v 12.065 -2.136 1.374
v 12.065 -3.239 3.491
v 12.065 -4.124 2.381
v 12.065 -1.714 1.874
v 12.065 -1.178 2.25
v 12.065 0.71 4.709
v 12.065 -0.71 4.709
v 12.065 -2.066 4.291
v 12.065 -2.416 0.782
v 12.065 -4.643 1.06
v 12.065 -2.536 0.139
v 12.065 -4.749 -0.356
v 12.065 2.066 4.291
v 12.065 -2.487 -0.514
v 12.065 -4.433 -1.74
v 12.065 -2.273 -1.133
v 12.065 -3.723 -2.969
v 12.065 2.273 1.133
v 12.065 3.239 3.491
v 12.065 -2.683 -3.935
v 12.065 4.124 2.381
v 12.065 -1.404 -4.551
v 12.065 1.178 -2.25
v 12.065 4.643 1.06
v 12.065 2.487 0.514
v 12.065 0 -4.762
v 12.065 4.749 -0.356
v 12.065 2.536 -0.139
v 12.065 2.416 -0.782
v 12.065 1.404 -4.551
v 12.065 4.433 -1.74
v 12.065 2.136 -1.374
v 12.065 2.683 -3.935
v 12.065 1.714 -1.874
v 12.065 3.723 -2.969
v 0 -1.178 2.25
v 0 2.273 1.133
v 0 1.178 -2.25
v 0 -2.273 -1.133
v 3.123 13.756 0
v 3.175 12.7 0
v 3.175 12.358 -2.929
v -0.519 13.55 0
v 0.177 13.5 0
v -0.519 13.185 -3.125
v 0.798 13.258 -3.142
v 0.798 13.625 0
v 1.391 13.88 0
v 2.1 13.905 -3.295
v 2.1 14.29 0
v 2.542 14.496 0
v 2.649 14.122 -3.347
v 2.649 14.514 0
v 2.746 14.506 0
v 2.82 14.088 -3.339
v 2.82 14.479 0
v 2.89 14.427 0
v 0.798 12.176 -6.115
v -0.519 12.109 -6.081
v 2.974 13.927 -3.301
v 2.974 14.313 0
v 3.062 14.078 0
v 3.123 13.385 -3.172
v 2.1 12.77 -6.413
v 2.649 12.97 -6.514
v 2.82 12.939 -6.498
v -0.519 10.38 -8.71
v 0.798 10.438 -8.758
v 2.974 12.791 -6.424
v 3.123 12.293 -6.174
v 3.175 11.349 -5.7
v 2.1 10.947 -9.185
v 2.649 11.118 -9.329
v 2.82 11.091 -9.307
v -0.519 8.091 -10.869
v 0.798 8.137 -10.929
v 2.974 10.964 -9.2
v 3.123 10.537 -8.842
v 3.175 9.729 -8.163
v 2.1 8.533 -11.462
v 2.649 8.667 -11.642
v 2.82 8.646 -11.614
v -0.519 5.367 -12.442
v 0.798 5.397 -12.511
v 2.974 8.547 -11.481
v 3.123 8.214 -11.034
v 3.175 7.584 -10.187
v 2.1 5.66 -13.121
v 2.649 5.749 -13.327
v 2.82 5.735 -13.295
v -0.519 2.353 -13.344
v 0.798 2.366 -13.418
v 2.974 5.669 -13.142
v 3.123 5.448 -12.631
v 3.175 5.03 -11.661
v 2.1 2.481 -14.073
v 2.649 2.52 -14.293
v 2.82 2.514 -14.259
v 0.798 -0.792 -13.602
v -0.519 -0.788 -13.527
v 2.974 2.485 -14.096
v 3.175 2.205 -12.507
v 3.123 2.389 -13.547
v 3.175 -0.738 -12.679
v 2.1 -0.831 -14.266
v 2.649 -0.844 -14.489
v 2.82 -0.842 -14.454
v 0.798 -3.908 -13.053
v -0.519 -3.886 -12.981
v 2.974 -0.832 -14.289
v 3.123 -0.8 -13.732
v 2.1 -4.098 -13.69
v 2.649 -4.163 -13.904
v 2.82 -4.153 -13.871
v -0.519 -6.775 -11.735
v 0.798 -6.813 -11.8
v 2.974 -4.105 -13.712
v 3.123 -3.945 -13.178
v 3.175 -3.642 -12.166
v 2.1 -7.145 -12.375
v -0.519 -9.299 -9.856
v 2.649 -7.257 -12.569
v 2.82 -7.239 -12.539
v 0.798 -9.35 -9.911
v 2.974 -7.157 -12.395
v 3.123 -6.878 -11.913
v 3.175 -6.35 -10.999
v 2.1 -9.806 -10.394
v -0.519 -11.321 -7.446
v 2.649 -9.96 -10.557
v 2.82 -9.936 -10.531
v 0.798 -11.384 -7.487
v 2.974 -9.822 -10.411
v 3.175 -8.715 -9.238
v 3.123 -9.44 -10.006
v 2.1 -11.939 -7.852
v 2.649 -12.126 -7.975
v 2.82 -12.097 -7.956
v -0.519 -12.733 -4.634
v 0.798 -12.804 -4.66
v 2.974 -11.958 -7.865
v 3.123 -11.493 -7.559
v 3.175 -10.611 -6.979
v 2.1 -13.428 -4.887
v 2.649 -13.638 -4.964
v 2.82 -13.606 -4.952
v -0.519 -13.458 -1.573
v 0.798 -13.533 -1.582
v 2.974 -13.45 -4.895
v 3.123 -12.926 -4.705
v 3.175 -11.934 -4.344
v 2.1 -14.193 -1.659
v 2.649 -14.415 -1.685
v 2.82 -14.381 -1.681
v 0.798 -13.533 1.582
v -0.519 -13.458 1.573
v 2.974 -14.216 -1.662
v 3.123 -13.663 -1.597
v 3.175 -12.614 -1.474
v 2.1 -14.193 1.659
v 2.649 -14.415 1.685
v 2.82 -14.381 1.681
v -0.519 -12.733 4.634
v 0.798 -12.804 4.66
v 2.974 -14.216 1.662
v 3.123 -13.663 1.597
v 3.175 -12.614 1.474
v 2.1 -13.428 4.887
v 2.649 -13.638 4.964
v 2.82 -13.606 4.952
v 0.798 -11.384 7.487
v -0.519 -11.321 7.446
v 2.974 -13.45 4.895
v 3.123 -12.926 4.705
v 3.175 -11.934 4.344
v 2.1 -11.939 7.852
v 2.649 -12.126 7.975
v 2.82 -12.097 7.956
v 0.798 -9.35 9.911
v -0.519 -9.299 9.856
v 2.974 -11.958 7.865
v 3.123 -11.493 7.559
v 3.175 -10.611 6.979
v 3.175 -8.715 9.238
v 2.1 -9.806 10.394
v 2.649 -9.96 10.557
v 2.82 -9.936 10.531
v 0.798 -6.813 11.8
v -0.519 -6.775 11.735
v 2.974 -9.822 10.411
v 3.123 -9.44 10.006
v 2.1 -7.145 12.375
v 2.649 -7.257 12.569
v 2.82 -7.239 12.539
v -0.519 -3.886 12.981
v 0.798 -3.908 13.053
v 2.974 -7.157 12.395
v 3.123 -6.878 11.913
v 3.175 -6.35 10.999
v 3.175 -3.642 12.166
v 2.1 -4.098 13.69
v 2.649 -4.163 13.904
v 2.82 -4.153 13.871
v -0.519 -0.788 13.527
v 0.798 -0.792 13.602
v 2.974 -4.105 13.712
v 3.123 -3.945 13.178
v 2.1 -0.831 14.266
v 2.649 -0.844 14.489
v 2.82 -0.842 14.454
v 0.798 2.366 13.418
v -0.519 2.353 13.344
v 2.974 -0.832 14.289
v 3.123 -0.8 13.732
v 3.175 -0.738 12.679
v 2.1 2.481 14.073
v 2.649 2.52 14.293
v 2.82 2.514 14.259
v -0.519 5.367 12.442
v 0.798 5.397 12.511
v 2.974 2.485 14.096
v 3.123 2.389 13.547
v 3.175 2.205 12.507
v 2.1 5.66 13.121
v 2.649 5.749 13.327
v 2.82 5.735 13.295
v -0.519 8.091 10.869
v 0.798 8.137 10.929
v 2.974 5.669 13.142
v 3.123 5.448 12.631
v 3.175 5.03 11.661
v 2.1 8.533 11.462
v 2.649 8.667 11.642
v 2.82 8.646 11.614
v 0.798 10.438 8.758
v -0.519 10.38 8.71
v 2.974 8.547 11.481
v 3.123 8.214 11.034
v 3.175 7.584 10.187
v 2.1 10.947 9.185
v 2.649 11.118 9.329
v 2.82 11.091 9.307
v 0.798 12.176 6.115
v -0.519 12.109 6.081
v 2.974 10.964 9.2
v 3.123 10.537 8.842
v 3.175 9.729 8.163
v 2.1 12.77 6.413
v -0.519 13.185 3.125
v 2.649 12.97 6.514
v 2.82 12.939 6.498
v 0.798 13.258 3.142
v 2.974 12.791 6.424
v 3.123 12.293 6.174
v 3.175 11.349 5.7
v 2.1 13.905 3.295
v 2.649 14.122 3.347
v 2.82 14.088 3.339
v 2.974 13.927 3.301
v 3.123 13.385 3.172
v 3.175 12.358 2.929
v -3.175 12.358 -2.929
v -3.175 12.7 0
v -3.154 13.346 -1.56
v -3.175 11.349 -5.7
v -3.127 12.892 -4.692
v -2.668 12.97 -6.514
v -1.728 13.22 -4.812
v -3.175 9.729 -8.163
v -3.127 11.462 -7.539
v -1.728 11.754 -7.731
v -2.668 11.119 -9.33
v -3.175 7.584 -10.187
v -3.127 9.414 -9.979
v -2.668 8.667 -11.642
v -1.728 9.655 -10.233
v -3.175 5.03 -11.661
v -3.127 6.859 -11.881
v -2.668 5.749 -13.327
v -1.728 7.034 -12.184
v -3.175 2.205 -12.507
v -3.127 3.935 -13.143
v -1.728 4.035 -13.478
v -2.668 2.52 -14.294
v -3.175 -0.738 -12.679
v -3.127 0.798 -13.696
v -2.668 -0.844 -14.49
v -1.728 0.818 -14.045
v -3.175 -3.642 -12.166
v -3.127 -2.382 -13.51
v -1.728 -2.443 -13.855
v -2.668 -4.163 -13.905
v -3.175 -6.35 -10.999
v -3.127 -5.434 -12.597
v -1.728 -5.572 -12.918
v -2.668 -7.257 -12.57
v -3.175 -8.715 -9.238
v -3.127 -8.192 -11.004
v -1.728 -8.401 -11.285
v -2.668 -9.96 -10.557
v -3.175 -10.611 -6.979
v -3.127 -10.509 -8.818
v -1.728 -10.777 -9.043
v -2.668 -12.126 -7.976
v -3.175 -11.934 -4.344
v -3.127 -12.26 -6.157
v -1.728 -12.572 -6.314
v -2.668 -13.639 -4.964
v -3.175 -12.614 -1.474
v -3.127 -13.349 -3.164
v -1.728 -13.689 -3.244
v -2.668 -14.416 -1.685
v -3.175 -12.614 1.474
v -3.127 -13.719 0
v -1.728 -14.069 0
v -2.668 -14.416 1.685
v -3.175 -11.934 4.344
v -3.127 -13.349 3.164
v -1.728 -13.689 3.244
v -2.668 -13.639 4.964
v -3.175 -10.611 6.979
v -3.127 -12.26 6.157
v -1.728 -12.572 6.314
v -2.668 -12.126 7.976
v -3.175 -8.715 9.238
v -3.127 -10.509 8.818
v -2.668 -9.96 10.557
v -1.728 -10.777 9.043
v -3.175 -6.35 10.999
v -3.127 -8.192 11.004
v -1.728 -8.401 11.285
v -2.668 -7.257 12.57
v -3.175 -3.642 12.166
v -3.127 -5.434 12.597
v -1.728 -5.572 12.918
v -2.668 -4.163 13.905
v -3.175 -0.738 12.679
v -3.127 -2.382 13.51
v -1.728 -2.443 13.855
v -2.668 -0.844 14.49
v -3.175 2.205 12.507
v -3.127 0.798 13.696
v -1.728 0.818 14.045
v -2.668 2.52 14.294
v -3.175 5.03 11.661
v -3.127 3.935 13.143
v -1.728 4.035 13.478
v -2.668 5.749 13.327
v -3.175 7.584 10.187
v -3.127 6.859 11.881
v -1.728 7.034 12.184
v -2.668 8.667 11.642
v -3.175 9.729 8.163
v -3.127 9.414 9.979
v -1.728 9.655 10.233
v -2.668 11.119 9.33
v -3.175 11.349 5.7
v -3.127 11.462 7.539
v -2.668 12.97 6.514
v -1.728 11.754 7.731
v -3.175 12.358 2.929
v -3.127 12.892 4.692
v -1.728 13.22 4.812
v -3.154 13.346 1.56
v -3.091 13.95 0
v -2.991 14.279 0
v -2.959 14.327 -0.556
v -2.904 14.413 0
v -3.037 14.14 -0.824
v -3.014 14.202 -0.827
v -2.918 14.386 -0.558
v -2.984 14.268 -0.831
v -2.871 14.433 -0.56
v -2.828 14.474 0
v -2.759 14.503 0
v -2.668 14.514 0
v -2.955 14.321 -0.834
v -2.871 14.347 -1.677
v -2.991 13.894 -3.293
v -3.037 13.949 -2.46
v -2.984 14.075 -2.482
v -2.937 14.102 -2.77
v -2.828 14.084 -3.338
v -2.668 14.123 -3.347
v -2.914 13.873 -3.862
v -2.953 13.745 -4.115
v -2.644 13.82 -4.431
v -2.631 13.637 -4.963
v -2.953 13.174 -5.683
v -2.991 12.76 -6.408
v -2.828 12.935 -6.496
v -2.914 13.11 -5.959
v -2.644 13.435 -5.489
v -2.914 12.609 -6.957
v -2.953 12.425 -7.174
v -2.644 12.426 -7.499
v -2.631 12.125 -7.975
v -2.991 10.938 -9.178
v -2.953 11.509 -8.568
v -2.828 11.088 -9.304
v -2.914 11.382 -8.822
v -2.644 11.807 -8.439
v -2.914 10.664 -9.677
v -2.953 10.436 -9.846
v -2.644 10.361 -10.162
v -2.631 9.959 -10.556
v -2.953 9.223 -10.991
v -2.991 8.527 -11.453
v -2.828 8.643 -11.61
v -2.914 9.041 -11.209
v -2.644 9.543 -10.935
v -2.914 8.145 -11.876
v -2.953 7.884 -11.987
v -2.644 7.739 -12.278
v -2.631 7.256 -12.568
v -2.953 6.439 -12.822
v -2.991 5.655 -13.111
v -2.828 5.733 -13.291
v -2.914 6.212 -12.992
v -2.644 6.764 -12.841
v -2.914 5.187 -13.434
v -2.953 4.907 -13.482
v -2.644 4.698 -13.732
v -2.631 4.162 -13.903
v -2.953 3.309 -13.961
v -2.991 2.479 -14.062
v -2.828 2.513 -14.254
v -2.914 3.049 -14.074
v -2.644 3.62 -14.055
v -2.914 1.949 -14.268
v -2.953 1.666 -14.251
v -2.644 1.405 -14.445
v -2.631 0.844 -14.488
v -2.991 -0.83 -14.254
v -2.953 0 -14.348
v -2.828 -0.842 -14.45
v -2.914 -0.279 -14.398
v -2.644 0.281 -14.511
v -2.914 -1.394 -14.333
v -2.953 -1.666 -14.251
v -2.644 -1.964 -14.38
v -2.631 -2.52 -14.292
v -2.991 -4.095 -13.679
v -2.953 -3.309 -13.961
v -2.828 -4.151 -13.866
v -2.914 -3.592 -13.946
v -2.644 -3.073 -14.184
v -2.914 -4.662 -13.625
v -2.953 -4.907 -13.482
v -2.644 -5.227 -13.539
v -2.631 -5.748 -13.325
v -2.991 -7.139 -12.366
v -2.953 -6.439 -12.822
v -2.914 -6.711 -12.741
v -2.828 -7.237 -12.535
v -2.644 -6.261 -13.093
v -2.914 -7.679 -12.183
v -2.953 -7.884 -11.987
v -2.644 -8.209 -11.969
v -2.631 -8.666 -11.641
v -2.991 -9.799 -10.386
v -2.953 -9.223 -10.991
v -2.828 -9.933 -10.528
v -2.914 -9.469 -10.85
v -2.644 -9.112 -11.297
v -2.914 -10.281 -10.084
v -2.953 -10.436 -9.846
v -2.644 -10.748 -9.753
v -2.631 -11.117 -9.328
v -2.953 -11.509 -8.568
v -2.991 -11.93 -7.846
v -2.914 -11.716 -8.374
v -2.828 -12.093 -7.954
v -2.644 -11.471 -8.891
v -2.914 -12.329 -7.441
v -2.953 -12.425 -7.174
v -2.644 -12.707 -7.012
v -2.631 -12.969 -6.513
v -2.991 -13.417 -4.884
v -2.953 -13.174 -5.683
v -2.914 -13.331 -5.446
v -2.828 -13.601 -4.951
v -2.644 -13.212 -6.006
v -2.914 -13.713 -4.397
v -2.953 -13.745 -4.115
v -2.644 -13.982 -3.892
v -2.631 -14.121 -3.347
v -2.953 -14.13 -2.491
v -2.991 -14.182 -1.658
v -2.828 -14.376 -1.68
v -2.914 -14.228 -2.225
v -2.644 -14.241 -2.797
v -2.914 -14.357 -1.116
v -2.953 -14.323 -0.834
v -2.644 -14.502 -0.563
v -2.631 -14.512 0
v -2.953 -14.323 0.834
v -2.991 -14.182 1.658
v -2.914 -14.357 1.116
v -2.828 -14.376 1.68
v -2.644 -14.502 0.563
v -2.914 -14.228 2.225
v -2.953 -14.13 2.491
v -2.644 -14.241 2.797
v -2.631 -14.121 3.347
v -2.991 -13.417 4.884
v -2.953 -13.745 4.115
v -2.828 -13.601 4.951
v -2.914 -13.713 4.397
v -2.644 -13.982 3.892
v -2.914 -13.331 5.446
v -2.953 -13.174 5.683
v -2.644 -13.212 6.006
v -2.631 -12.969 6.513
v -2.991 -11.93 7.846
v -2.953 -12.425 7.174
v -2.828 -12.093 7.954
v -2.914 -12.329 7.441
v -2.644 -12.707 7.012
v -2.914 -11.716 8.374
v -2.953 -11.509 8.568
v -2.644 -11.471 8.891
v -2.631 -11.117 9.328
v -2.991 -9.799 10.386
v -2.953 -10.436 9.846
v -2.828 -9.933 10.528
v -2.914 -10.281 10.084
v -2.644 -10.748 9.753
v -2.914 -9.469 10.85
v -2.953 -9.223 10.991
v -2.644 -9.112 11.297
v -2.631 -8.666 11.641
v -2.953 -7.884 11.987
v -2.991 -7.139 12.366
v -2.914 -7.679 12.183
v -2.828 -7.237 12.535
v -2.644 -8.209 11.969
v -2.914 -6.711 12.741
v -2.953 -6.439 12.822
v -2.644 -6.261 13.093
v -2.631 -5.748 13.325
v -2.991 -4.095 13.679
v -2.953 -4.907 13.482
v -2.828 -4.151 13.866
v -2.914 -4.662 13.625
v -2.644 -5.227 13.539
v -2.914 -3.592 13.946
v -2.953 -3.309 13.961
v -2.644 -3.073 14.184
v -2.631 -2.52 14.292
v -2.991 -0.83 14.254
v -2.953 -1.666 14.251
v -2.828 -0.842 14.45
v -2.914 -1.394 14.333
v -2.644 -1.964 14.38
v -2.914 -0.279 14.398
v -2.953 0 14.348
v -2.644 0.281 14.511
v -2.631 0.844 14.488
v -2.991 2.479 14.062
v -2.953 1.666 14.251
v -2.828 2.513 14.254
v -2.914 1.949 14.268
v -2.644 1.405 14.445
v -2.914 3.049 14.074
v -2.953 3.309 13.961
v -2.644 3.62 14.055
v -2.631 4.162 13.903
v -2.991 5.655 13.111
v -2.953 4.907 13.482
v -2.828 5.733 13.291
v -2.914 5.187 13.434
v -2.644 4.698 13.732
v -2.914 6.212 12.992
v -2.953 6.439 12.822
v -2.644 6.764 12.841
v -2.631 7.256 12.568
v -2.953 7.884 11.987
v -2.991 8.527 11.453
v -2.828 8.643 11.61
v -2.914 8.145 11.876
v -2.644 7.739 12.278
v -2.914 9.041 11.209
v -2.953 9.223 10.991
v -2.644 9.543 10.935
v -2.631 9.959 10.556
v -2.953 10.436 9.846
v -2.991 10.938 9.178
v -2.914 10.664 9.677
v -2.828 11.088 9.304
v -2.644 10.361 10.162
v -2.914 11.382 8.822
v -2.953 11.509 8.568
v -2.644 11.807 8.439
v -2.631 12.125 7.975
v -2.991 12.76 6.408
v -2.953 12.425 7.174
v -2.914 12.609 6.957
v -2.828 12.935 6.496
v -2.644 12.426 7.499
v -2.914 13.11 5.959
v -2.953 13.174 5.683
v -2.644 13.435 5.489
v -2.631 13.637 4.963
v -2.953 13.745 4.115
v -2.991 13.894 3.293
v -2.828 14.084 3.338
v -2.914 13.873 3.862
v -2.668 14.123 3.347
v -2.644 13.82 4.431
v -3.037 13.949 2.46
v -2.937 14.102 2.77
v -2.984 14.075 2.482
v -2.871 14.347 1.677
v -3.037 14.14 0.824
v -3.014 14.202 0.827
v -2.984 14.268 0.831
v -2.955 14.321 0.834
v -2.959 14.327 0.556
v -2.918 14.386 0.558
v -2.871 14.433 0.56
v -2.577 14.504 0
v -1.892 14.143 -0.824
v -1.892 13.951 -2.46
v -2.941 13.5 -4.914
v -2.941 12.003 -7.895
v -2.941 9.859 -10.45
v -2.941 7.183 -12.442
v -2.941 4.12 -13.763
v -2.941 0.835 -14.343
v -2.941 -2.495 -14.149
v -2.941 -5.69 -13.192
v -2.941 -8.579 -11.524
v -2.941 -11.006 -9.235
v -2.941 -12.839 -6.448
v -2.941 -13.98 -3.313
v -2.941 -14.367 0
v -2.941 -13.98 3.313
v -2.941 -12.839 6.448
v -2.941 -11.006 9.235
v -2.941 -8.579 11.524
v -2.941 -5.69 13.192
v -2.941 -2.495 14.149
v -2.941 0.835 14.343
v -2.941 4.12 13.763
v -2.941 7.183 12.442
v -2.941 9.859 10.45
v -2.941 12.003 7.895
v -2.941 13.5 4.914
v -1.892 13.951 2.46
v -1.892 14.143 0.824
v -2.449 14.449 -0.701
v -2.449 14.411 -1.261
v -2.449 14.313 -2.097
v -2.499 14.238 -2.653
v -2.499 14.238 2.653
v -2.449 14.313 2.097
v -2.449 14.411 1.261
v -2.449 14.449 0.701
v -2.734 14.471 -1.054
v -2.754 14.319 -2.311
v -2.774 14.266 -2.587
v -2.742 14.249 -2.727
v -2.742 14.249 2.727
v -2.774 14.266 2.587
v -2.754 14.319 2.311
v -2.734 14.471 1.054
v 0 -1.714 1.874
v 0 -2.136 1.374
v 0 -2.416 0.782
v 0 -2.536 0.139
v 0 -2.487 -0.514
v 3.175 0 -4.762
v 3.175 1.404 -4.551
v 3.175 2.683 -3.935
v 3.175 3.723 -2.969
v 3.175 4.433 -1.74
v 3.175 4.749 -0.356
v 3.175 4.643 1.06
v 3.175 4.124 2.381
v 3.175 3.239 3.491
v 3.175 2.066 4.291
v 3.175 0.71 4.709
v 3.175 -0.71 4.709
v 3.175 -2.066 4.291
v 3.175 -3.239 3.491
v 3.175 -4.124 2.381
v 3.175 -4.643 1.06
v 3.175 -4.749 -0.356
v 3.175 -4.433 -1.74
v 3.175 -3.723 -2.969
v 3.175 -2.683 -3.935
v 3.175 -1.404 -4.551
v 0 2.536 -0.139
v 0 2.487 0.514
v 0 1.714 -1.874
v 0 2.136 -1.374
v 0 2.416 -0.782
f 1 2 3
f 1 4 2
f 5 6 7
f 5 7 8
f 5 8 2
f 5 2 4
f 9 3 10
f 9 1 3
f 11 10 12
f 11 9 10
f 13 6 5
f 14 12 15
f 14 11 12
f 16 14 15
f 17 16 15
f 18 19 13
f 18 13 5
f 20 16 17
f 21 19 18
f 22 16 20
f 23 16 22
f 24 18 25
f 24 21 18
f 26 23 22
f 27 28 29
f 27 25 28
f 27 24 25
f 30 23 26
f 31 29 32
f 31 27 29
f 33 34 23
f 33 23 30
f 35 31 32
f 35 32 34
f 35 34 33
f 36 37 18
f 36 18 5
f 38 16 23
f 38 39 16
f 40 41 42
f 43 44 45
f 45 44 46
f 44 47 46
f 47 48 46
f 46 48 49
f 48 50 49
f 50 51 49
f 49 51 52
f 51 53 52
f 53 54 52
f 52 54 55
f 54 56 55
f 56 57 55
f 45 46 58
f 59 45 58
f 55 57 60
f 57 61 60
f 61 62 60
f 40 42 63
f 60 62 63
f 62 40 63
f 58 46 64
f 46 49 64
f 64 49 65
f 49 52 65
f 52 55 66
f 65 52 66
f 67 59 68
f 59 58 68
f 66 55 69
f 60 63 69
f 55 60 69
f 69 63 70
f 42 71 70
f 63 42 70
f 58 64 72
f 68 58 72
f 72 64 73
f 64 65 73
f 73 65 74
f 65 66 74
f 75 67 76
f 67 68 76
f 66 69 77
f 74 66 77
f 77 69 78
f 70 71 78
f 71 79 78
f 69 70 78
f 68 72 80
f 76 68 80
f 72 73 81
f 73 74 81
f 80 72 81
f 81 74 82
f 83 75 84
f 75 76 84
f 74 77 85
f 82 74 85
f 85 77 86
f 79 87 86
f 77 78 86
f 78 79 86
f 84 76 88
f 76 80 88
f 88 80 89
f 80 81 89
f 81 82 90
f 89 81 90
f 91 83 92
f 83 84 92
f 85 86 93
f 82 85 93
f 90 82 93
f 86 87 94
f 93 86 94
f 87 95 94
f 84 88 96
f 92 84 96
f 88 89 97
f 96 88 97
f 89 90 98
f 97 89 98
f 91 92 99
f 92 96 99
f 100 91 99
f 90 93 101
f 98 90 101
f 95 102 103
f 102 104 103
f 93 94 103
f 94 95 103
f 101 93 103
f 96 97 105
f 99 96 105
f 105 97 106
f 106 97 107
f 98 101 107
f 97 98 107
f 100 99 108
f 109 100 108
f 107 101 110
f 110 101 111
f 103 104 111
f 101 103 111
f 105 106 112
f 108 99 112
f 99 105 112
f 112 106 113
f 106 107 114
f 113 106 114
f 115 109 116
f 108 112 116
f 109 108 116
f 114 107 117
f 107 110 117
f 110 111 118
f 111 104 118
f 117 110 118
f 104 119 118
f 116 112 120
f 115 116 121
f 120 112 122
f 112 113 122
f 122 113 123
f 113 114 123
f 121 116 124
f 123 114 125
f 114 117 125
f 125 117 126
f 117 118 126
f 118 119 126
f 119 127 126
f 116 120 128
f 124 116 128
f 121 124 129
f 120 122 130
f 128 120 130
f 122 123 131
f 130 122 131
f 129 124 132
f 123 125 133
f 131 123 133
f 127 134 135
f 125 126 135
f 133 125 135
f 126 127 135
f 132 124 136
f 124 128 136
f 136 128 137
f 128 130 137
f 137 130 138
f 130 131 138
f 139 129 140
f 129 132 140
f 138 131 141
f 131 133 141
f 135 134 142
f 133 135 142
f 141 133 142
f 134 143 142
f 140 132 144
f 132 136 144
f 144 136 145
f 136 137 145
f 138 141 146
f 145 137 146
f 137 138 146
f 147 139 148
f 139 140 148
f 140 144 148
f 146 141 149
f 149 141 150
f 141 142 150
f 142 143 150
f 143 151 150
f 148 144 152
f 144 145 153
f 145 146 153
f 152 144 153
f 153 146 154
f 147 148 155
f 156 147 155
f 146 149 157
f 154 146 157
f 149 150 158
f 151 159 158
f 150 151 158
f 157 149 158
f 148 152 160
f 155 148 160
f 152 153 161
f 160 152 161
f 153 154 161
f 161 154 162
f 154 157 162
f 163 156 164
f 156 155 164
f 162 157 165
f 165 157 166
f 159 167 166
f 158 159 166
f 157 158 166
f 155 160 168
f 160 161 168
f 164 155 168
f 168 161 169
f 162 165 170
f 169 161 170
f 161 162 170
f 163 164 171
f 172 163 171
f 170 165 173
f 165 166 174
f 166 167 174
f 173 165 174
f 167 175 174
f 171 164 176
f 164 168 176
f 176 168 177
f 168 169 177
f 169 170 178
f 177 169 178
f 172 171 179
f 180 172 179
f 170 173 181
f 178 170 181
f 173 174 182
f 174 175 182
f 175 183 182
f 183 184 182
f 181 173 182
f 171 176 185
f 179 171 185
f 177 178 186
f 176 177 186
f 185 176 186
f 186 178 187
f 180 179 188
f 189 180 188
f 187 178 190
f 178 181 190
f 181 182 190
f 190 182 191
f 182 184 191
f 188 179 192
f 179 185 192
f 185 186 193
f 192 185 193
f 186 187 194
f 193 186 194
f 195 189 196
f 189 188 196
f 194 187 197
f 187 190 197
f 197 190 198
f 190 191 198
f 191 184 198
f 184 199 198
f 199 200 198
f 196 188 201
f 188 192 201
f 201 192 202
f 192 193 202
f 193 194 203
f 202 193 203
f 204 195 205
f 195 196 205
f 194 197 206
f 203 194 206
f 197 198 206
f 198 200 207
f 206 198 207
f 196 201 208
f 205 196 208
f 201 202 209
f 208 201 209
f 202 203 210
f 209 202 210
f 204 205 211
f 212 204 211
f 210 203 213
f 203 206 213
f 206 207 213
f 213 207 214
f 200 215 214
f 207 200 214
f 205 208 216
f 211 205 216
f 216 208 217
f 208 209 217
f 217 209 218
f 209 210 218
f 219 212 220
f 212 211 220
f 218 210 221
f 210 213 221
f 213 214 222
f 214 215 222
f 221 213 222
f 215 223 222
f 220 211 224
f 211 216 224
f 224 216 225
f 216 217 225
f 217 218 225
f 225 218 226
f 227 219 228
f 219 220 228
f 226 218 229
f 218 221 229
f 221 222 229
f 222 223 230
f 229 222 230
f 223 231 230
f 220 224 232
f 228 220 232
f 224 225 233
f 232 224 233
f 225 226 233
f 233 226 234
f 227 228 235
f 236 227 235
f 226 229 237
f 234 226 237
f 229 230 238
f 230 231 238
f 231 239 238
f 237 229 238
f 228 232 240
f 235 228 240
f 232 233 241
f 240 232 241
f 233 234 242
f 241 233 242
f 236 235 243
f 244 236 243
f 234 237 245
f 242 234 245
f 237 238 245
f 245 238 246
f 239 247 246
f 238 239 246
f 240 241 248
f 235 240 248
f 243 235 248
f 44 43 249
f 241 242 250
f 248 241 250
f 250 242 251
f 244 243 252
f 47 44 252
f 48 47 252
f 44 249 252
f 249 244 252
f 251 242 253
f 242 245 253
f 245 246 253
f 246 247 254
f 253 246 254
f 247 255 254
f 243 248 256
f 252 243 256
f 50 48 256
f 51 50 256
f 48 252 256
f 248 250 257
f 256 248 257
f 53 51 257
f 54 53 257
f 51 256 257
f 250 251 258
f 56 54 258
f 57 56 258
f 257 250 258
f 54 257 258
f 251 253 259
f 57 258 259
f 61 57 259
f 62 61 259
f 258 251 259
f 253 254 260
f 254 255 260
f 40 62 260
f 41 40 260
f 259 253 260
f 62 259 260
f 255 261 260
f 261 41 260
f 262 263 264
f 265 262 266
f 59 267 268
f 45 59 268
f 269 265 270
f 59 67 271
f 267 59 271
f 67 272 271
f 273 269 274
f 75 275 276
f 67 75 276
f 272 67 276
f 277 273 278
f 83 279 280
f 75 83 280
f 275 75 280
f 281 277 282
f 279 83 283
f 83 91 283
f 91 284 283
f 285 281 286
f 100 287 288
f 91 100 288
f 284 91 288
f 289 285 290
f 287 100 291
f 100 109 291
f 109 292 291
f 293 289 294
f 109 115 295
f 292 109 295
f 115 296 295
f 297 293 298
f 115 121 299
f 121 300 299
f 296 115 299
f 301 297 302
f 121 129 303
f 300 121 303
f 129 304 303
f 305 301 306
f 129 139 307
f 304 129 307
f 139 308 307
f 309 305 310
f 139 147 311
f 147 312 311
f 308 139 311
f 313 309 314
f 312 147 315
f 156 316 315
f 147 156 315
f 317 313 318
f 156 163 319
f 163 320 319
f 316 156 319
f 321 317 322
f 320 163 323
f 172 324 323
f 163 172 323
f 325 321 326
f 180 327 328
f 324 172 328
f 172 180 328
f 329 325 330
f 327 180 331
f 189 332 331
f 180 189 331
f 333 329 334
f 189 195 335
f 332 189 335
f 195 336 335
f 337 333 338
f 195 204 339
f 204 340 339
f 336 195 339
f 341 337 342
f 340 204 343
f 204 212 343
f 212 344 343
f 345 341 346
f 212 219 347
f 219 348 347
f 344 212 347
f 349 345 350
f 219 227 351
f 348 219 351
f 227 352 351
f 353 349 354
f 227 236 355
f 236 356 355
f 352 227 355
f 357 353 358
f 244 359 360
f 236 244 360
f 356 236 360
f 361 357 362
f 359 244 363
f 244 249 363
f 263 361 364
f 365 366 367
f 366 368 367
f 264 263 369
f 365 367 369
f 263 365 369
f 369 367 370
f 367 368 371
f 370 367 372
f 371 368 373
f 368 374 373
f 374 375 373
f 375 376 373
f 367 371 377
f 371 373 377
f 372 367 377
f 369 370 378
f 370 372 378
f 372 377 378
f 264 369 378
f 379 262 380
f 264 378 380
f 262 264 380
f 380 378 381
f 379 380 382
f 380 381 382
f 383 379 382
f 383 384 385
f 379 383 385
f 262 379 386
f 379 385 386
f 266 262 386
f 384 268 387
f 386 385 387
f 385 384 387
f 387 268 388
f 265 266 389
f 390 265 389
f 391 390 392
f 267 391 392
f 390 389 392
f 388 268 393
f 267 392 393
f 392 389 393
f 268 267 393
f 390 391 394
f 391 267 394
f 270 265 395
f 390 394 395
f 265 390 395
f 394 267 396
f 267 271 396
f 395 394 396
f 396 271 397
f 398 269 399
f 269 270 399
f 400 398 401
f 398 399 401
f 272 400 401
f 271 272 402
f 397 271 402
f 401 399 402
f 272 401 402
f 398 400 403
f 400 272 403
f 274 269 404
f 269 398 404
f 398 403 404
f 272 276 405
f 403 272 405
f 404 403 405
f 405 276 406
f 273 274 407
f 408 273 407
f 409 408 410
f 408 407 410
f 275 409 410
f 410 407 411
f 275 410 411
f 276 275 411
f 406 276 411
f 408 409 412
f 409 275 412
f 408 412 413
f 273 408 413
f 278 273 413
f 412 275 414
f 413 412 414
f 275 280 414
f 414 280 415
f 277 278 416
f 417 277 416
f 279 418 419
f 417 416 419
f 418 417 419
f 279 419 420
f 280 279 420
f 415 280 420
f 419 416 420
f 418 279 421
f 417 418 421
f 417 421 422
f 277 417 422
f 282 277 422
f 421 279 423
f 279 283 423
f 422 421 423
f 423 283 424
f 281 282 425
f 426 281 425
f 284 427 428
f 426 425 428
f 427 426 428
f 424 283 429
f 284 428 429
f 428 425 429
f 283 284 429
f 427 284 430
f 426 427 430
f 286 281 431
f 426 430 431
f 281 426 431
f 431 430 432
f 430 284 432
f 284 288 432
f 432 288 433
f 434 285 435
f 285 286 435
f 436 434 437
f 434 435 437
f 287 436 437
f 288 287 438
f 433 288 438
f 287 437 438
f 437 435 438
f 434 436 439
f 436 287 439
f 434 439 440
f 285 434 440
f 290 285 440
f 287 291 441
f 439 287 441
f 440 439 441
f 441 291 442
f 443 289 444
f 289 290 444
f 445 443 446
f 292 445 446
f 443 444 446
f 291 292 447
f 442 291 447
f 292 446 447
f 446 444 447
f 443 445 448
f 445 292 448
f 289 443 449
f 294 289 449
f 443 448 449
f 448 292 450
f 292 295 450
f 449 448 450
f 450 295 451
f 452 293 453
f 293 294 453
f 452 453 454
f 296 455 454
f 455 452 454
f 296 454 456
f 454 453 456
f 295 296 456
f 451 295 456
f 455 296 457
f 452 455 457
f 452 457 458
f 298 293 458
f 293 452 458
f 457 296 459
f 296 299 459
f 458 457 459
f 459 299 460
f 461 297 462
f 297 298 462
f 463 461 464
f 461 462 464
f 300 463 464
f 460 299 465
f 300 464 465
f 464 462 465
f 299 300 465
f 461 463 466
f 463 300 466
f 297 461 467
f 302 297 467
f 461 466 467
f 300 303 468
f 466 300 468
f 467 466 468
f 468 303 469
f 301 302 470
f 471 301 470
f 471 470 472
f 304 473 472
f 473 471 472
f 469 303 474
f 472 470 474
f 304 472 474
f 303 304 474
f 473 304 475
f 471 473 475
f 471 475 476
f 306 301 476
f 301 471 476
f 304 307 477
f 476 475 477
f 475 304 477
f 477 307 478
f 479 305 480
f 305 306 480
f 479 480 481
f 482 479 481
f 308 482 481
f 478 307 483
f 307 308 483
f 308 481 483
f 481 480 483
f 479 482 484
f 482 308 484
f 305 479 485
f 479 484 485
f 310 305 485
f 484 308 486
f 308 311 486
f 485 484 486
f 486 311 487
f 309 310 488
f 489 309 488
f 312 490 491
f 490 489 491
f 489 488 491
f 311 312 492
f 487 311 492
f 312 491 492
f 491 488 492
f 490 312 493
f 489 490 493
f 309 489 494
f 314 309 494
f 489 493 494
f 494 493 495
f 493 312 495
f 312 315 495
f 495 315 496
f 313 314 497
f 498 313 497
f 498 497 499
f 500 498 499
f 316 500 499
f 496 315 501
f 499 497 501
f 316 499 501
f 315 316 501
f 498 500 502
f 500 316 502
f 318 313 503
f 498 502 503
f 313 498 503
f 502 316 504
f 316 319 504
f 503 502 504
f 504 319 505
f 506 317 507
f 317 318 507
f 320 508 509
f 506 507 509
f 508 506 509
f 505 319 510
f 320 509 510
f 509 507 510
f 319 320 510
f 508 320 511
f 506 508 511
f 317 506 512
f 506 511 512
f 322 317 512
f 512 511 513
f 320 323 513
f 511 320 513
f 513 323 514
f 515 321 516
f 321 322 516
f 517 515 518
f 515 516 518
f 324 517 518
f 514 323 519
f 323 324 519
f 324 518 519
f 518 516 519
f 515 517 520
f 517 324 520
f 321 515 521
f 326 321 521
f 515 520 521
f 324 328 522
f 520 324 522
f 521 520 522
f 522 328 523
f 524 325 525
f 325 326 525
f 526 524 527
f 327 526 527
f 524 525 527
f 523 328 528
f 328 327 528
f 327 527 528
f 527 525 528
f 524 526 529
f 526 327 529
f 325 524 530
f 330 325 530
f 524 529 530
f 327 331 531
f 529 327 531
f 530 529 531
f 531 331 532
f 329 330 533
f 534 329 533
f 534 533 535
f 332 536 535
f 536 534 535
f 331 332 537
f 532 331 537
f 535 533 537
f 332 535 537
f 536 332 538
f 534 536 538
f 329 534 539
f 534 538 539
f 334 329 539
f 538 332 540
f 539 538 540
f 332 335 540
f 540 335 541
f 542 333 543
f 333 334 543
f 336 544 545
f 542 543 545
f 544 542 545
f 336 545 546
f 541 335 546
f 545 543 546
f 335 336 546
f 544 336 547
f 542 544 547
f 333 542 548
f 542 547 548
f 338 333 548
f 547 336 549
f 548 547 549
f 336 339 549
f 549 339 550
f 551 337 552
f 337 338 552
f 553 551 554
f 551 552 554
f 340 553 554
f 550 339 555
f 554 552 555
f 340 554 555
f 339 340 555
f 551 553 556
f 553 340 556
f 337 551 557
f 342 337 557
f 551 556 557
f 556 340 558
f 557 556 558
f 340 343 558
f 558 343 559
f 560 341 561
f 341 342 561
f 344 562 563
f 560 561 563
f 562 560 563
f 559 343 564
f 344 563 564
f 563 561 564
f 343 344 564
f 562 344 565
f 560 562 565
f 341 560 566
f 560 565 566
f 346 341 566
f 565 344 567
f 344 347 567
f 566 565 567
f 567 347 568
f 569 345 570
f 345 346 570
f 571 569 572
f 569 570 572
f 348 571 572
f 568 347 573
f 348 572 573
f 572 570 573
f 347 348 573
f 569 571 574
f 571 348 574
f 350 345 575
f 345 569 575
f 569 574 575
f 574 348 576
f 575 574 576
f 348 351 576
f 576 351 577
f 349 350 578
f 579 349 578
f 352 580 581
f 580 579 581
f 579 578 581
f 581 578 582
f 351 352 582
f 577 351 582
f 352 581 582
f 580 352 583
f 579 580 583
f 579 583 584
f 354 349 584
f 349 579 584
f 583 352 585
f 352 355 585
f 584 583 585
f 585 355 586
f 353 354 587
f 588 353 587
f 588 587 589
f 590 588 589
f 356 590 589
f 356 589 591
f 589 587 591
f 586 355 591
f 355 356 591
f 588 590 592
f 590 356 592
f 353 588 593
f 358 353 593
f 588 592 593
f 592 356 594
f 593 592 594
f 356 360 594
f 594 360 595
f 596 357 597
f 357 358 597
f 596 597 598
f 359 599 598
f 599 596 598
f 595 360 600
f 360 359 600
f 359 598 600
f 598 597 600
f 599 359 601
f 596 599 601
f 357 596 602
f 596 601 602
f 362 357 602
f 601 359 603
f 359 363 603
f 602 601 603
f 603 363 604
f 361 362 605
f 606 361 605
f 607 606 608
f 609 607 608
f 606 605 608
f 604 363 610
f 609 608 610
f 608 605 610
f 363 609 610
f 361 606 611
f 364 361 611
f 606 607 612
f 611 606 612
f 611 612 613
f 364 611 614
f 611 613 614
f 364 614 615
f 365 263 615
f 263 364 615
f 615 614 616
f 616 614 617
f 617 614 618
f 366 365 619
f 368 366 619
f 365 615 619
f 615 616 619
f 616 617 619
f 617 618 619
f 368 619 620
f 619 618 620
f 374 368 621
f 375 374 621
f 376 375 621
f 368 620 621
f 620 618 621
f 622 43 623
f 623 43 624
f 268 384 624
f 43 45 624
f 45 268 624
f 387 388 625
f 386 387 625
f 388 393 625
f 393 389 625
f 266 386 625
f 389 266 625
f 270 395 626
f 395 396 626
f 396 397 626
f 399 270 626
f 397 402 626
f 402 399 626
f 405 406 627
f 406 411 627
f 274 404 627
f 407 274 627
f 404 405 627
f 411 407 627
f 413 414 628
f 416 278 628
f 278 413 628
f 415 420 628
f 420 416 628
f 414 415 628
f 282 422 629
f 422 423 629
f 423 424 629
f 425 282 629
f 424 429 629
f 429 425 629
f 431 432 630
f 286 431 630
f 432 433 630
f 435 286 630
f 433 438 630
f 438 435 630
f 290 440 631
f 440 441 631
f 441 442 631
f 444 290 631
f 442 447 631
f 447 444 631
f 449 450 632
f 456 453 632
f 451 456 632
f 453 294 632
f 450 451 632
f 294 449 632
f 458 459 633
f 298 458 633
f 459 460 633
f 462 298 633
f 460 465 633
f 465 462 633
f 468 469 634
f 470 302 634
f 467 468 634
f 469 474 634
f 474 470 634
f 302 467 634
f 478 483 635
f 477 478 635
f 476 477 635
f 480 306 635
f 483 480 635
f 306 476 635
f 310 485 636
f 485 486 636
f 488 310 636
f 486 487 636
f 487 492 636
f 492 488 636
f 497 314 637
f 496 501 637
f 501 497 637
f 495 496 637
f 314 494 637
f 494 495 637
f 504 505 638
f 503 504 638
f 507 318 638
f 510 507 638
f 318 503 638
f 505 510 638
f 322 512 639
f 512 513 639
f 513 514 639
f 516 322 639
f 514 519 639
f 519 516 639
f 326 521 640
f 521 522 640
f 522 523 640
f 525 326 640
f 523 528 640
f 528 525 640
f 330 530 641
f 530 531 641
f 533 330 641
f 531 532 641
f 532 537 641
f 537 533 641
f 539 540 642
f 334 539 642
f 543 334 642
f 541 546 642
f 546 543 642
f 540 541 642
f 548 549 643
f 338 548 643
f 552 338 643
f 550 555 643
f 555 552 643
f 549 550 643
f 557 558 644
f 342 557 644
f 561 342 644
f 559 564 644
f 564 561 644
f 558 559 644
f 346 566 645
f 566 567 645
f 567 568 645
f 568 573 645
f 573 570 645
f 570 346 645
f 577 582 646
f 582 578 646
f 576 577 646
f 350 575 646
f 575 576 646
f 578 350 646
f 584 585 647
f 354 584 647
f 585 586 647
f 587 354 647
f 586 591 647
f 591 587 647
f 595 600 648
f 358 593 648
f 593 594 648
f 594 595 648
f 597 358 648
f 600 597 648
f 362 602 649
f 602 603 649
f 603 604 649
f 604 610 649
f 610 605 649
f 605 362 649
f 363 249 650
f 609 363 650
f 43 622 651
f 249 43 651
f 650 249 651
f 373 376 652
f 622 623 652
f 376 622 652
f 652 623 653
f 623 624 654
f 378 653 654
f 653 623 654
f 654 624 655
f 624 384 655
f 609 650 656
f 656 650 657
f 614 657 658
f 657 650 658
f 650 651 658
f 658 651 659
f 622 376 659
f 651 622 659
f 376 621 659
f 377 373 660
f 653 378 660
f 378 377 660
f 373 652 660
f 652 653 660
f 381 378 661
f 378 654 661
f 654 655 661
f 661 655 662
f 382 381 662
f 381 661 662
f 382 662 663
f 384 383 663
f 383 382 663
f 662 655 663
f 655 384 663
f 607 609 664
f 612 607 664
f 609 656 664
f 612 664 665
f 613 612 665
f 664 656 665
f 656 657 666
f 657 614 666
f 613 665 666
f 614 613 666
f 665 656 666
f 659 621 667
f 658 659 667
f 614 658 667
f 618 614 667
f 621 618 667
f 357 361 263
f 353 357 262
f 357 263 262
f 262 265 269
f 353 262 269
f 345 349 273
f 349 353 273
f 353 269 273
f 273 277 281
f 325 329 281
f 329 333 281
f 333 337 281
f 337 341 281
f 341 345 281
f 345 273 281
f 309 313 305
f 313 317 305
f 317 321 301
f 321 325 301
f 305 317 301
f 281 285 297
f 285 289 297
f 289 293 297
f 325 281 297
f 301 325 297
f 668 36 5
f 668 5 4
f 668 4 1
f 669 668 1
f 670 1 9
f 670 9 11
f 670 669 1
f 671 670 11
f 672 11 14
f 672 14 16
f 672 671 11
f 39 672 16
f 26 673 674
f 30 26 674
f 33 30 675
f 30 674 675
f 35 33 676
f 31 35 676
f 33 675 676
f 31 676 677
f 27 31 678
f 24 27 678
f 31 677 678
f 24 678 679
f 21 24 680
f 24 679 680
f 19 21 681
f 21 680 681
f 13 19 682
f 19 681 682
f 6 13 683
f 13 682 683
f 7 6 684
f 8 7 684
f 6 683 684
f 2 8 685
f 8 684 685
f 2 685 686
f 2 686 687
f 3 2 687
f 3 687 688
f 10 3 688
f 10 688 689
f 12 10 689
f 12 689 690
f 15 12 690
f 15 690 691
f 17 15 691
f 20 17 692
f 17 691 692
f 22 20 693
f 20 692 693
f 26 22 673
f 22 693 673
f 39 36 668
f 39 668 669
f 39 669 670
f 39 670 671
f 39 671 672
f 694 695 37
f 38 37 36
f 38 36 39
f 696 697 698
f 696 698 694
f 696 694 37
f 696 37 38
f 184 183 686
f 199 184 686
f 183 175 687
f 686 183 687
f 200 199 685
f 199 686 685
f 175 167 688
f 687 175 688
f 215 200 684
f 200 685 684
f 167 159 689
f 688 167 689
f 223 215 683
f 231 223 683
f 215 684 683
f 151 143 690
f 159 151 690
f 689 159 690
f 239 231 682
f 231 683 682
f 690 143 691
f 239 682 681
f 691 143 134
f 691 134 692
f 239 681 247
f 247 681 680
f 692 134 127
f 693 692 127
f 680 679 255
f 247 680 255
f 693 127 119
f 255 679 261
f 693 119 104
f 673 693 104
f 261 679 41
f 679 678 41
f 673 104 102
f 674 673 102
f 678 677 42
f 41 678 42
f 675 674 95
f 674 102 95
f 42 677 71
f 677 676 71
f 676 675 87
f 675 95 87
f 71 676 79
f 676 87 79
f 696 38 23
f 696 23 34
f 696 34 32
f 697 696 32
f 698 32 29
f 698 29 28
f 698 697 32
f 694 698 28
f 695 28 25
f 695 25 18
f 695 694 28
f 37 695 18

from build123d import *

# Parameters (mm, degrees)
SKETCH2_R           = 4.7625
BOSS_EXTRUDE1_DEPTH = 8.89
CUT_EXTRUDE1_START  = -3.175
CUT_EXTRUDE1_DEPTH  = 3.175


with BuildPart() as part:
    # Sketch1 → Revolve1 (revolve)
    with BuildSketch(Plane.XY):
        with BuildLine():
            Line((0, 0), (-3.175, 0))
            Line((-3.175, 0), (-3.175, 12.7))
            add(Edge.make_bspline(
                [(-3.175, 12.7), (-3.175, 19.05), (0, 6.35), (3.175, 19.05), (3.175, 12.7)],
                knots=[0, 0, 0, 0, 0, 1, 1, 1, 1, 1], degree=4))
            Line((3.175, 12.7), (3.175, 0))
            Line((3.175, 0), (0, 0))
        make_face()
    revolve(axis=Axis((0, 0, 0), (-1, 0, 0)))

    # Sketch2 → Boss-Extrude1 (add)
    with BuildSketch(Plane(origin=(3.175, 0, 0), x_dir=(0, 0, -1), z_dir=(1, 0, 0))):
        Circle(SKETCH2_R)
        with BuildLine():
            Line((1.132738197, -2.273434446), (2.250324949, 1.177980315))
            ThreePointArc((2.250324949, 1.177980315), (0.782467236, 2.416473676), (-1.132738197, 2.273434446))
            Line((-1.132738197, 2.273434446), (-2.250324949, -1.177980315))
            ThreePointArc((-2.250324949, -1.177980315), (-0.782467236, -2.416473676), (1.132738197, -2.273434446))
        make_face(mode=Mode.SUBTRACT)
    extrude(amount=BOSS_EXTRUDE1_DEPTH)

    # Sketch2<2> → Cut-Extrude1 (cut)
    with BuildSketch(Plane(origin=(3.175, 0, 0), x_dir=(0, 0, -1), z_dir=(1, 0, 0)).offset(CUT_EXTRUDE1_START)):
        with BuildLine():
            Line((1.132738197, -2.273434446), (2.250324949, 1.177980315))
            ThreePointArc((2.250324949, 1.177980315), (0.782467236, 2.416473676), (-1.132738197, 2.273434446))
            Line((-1.132738197, 2.273434446), (-2.250324949, -1.177980315))
            ThreePointArc((-2.250324949, -1.177980315), (-0.782467236, -2.416473676), (1.132738197, -2.273434446))
        make_face()
    extrude(amount=CUT_EXTRUDE1_DEPTH, mode=Mode.SUBTRACT)


solid = part.part
